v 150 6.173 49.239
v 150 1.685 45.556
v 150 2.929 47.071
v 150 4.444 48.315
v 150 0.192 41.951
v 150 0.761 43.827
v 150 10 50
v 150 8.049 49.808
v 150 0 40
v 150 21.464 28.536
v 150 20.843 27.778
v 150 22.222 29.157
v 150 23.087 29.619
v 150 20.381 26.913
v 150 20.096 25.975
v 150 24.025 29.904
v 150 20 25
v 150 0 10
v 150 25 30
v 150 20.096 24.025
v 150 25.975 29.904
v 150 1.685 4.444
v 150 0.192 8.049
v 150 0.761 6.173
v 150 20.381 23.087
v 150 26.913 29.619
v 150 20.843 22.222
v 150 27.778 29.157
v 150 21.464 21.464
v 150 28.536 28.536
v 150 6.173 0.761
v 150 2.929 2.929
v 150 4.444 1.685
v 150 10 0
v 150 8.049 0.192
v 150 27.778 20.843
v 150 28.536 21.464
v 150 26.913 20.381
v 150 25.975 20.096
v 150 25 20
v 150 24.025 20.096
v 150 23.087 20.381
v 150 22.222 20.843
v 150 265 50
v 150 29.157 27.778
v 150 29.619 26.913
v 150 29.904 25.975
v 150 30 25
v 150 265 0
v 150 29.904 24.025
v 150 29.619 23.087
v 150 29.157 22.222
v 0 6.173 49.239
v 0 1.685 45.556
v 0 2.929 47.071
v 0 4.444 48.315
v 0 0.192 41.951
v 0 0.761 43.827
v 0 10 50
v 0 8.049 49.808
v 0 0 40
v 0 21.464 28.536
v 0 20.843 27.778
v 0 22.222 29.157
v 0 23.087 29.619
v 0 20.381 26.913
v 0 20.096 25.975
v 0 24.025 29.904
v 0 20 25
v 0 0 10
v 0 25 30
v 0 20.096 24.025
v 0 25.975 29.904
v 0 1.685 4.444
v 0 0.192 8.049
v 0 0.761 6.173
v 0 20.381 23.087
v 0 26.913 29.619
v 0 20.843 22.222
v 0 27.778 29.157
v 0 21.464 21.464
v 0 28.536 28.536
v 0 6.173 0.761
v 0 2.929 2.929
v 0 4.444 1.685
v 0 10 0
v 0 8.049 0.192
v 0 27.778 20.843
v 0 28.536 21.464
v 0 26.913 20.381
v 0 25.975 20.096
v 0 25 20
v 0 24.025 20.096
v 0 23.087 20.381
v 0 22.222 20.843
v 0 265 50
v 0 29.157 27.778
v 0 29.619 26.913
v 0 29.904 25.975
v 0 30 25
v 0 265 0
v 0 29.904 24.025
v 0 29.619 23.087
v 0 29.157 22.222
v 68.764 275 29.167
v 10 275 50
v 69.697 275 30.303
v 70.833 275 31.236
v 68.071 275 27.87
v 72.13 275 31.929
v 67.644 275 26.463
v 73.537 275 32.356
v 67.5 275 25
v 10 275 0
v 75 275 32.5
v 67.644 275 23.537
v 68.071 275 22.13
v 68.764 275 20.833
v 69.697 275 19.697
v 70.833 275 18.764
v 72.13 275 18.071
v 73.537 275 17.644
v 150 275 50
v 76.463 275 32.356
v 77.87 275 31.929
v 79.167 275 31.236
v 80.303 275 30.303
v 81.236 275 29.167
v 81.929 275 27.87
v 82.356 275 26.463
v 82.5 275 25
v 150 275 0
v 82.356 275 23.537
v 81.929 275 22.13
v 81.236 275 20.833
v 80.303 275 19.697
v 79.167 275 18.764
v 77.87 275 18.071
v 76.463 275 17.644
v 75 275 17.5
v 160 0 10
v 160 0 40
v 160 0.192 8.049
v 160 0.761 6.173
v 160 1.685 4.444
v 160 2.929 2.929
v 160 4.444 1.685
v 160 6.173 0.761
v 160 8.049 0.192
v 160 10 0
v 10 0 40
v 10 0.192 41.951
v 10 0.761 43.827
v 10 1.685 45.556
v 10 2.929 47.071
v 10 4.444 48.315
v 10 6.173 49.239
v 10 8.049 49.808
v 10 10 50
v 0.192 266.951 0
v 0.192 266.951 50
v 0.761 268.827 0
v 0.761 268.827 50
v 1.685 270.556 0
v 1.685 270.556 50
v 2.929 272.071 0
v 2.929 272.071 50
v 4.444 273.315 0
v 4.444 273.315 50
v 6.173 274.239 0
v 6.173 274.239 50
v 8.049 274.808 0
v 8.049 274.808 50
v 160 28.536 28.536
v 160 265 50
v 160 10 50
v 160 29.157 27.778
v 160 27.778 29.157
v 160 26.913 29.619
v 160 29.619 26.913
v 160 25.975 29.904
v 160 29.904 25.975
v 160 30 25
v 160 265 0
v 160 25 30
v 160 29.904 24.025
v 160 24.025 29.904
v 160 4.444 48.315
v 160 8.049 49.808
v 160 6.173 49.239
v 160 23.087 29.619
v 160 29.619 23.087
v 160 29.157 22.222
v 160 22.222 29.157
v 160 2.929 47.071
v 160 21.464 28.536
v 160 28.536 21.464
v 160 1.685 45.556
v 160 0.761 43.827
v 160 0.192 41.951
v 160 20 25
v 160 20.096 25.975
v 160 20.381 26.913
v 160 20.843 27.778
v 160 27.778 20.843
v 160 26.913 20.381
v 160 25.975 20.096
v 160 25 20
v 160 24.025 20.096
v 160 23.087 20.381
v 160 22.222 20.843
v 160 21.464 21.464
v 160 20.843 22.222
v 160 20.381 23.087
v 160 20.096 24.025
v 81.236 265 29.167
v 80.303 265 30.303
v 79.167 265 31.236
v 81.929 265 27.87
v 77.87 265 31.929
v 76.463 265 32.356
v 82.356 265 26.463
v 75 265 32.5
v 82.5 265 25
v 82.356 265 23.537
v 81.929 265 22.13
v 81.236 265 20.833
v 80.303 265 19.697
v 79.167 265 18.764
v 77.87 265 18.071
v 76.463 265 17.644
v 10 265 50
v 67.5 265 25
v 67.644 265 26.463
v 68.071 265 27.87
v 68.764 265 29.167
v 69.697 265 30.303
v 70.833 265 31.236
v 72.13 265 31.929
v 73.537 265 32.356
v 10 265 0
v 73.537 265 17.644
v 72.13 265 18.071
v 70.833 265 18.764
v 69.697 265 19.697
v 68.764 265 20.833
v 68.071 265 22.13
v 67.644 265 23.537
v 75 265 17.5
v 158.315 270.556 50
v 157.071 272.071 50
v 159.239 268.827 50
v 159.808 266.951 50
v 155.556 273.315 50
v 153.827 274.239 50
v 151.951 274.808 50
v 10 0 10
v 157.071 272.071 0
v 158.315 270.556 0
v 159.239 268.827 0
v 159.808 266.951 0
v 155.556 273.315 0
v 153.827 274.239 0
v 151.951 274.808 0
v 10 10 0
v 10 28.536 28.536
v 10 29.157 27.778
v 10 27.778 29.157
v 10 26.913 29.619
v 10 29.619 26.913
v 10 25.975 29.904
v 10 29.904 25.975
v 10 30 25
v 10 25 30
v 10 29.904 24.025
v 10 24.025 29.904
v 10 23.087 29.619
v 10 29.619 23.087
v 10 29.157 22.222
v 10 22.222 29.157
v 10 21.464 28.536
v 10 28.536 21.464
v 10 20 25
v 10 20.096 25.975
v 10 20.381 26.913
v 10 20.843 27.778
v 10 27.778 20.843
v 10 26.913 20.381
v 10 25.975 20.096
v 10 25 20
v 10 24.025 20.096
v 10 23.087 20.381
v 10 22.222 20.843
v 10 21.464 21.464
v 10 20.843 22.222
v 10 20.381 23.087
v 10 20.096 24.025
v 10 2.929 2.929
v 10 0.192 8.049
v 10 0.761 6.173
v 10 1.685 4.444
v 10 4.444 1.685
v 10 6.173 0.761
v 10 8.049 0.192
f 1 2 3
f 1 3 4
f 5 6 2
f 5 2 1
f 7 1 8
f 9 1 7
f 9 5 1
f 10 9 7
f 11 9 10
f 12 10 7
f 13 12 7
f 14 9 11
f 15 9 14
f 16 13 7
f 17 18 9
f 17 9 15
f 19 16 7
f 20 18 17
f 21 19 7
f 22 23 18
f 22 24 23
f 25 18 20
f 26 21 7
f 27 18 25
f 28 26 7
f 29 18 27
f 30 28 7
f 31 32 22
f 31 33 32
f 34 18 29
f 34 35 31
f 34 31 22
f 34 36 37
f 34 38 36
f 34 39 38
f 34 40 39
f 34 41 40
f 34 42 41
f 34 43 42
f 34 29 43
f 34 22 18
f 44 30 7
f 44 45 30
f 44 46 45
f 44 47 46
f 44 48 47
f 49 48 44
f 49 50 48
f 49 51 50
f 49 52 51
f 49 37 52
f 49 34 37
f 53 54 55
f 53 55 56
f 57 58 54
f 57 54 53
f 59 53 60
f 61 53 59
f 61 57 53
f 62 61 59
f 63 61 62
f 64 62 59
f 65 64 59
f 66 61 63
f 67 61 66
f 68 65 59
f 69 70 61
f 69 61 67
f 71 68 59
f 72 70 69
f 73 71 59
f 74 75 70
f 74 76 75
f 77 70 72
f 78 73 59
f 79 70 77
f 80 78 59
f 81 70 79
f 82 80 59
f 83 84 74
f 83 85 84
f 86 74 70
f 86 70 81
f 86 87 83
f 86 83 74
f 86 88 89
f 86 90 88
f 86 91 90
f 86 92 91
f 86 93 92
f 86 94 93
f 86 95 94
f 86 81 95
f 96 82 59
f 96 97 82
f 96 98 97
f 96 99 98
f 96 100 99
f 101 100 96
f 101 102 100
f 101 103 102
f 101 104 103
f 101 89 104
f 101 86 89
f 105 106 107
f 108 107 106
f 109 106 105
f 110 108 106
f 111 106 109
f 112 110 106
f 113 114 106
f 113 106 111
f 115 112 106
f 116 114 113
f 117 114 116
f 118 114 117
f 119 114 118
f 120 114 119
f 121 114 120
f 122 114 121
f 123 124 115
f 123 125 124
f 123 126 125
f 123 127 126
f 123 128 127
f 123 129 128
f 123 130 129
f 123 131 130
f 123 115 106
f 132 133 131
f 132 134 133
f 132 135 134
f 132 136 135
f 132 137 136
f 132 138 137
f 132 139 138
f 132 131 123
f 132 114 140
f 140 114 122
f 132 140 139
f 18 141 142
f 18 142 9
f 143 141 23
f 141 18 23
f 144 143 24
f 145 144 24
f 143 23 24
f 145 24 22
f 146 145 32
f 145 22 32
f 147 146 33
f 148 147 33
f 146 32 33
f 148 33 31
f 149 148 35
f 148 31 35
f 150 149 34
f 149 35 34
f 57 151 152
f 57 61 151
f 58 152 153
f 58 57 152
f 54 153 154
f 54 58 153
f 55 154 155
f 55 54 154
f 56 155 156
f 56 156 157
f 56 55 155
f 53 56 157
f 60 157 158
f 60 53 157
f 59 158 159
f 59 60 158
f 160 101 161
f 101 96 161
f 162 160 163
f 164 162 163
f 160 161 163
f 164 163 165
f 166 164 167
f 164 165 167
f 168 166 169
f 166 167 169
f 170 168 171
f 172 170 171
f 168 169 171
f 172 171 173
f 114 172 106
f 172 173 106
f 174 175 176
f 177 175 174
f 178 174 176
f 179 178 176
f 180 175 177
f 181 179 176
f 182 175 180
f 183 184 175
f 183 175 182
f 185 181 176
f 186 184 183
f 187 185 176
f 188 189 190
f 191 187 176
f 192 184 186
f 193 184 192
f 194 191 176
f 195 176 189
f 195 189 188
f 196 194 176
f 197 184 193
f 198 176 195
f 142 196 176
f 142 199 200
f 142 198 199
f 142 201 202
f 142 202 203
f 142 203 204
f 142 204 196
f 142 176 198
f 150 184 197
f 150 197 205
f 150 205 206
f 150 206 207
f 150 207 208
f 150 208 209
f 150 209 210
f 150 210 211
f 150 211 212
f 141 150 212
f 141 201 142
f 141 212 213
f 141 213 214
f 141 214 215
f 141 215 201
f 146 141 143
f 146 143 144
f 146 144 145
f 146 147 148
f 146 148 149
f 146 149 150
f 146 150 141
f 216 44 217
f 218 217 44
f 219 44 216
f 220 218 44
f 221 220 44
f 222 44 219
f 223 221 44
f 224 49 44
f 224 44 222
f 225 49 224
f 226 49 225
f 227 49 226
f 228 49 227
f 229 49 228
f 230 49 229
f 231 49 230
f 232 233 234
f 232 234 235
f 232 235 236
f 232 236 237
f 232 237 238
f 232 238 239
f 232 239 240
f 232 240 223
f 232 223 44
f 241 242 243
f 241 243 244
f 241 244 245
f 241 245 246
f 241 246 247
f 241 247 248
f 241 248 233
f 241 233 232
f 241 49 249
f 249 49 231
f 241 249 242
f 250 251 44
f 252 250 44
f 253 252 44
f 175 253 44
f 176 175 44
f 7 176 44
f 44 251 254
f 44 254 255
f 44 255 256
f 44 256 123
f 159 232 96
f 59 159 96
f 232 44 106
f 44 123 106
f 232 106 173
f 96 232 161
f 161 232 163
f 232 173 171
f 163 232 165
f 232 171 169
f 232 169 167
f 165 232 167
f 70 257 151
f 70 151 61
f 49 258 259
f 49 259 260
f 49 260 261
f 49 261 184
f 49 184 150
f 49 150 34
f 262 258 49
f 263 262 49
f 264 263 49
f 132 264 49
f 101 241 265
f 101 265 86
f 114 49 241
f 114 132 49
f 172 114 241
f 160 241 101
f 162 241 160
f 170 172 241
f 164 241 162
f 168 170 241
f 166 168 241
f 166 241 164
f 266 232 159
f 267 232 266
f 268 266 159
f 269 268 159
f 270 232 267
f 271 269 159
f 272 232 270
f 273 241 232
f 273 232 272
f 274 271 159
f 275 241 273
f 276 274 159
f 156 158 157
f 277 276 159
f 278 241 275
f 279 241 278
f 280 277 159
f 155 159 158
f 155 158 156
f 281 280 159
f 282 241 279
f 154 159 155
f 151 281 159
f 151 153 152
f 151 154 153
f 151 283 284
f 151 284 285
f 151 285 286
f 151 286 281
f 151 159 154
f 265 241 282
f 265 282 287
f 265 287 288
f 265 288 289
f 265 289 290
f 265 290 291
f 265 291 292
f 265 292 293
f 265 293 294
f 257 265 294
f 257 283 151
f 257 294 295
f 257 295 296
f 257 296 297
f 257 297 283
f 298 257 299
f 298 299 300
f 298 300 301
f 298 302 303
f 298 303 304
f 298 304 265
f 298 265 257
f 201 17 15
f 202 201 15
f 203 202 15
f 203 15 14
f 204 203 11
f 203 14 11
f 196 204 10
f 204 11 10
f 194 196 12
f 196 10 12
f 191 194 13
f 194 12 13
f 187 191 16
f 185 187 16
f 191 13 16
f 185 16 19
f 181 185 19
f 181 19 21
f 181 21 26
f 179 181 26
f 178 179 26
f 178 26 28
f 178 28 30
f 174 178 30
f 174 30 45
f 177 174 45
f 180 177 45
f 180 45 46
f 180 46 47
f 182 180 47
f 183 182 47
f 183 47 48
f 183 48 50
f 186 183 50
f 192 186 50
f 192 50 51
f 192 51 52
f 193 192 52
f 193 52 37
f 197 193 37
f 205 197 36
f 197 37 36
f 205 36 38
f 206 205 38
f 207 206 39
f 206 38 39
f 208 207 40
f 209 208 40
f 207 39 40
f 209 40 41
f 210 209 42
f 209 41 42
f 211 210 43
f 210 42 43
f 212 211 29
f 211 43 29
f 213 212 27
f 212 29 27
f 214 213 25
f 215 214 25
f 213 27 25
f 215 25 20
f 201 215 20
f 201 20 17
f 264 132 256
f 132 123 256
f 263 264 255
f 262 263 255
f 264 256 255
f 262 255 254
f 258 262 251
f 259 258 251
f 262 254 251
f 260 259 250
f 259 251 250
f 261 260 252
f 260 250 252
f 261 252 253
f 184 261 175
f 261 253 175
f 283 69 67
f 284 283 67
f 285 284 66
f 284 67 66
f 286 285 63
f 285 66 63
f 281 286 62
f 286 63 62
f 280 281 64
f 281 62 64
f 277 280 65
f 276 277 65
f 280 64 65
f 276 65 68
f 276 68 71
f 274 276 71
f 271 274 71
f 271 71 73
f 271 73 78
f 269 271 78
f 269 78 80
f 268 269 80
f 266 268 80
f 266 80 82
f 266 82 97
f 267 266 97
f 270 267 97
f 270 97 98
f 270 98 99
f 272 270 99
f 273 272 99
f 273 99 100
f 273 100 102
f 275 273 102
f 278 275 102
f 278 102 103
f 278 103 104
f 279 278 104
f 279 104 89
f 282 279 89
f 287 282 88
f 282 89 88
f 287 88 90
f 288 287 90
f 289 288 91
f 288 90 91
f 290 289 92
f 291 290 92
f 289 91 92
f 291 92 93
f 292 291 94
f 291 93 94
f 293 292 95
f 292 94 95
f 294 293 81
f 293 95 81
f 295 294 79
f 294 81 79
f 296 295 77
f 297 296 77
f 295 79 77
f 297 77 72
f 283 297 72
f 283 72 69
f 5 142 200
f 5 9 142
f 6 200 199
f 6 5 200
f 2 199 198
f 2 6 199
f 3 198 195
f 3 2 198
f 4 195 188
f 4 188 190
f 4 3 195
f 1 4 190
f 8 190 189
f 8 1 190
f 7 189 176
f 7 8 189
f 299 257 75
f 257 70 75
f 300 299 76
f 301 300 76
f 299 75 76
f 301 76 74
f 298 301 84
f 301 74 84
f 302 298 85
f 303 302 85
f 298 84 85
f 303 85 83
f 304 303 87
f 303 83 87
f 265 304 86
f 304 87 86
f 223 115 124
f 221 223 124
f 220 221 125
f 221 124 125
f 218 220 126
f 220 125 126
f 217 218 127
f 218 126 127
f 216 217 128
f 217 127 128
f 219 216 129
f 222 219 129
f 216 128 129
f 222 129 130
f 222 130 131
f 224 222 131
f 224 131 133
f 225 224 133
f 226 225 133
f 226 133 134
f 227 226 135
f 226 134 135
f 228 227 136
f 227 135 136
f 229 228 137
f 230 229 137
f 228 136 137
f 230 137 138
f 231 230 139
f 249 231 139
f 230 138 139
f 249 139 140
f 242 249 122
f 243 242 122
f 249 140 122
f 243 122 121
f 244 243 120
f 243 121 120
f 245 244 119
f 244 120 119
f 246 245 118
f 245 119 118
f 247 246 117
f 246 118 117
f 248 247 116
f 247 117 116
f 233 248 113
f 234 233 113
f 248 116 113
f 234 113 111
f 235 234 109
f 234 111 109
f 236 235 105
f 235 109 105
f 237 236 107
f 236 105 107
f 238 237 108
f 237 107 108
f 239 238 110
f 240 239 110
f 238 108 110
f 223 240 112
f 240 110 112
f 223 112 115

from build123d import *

# Parameters (mm, degrees)
BOSS_EXTRUDE1_DEPTH = 50
FILLET1_R           = 10
SKETCH2_R           = 5
CUT_EXTRUDE1_DEPTH  = 170
SKETCH4_R           = 7.5
CUT_EXTRUDE2_DEPTH  = 10


with BuildPart() as part:
    # Sketch1 → Boss-Extrude1 (new body)
    with BuildSketch(Plane.XY):
        Polygon((0, 0), (0, 275), (160, 275), (160, 0), (150, 0), (150, 265), (10, 265), (10, 0), align=None)
    extrude(amount=BOSS_EXTRUDE1_DEPTH)

    # Fillet1
    fillet1_edges = [part.edges().sort_by_distance(p)[0] for p in [
        (5, 0, 0),
        (0, 275, 25),
        (160, 275, 25),
        (155, 0, 50),
        (5, 0, 50),
        (155, 0, 0),
    ]]
    fillet(fillet1_edges, radius=FILLET1_R)

    # Sketch2 → Cut-Extrude1 (cut)
    with BuildSketch(Plane.ZY):
        with Locations(Location((25, 25, 0), (0, 0, 270))):
            Circle(SKETCH2_R)
    extrude(amount=-CUT_EXTRUDE1_DEPTH, mode=Mode.SUBTRACT)

    # Sketch4 → Cut-Extrude2 (cut)
    with BuildSketch(Plane(origin=(0, 275, 0), x_dir=(1, 0, 0), z_dir=(0, 1, 0))):
        with Locations(Location((75, -25, 0), (0, 0, 270))):
            Circle(SKETCH4_R)
    extrude(amount=-CUT_EXTRUDE2_DEPTH, mode=Mode.SUBTRACT)


solid = part.part
